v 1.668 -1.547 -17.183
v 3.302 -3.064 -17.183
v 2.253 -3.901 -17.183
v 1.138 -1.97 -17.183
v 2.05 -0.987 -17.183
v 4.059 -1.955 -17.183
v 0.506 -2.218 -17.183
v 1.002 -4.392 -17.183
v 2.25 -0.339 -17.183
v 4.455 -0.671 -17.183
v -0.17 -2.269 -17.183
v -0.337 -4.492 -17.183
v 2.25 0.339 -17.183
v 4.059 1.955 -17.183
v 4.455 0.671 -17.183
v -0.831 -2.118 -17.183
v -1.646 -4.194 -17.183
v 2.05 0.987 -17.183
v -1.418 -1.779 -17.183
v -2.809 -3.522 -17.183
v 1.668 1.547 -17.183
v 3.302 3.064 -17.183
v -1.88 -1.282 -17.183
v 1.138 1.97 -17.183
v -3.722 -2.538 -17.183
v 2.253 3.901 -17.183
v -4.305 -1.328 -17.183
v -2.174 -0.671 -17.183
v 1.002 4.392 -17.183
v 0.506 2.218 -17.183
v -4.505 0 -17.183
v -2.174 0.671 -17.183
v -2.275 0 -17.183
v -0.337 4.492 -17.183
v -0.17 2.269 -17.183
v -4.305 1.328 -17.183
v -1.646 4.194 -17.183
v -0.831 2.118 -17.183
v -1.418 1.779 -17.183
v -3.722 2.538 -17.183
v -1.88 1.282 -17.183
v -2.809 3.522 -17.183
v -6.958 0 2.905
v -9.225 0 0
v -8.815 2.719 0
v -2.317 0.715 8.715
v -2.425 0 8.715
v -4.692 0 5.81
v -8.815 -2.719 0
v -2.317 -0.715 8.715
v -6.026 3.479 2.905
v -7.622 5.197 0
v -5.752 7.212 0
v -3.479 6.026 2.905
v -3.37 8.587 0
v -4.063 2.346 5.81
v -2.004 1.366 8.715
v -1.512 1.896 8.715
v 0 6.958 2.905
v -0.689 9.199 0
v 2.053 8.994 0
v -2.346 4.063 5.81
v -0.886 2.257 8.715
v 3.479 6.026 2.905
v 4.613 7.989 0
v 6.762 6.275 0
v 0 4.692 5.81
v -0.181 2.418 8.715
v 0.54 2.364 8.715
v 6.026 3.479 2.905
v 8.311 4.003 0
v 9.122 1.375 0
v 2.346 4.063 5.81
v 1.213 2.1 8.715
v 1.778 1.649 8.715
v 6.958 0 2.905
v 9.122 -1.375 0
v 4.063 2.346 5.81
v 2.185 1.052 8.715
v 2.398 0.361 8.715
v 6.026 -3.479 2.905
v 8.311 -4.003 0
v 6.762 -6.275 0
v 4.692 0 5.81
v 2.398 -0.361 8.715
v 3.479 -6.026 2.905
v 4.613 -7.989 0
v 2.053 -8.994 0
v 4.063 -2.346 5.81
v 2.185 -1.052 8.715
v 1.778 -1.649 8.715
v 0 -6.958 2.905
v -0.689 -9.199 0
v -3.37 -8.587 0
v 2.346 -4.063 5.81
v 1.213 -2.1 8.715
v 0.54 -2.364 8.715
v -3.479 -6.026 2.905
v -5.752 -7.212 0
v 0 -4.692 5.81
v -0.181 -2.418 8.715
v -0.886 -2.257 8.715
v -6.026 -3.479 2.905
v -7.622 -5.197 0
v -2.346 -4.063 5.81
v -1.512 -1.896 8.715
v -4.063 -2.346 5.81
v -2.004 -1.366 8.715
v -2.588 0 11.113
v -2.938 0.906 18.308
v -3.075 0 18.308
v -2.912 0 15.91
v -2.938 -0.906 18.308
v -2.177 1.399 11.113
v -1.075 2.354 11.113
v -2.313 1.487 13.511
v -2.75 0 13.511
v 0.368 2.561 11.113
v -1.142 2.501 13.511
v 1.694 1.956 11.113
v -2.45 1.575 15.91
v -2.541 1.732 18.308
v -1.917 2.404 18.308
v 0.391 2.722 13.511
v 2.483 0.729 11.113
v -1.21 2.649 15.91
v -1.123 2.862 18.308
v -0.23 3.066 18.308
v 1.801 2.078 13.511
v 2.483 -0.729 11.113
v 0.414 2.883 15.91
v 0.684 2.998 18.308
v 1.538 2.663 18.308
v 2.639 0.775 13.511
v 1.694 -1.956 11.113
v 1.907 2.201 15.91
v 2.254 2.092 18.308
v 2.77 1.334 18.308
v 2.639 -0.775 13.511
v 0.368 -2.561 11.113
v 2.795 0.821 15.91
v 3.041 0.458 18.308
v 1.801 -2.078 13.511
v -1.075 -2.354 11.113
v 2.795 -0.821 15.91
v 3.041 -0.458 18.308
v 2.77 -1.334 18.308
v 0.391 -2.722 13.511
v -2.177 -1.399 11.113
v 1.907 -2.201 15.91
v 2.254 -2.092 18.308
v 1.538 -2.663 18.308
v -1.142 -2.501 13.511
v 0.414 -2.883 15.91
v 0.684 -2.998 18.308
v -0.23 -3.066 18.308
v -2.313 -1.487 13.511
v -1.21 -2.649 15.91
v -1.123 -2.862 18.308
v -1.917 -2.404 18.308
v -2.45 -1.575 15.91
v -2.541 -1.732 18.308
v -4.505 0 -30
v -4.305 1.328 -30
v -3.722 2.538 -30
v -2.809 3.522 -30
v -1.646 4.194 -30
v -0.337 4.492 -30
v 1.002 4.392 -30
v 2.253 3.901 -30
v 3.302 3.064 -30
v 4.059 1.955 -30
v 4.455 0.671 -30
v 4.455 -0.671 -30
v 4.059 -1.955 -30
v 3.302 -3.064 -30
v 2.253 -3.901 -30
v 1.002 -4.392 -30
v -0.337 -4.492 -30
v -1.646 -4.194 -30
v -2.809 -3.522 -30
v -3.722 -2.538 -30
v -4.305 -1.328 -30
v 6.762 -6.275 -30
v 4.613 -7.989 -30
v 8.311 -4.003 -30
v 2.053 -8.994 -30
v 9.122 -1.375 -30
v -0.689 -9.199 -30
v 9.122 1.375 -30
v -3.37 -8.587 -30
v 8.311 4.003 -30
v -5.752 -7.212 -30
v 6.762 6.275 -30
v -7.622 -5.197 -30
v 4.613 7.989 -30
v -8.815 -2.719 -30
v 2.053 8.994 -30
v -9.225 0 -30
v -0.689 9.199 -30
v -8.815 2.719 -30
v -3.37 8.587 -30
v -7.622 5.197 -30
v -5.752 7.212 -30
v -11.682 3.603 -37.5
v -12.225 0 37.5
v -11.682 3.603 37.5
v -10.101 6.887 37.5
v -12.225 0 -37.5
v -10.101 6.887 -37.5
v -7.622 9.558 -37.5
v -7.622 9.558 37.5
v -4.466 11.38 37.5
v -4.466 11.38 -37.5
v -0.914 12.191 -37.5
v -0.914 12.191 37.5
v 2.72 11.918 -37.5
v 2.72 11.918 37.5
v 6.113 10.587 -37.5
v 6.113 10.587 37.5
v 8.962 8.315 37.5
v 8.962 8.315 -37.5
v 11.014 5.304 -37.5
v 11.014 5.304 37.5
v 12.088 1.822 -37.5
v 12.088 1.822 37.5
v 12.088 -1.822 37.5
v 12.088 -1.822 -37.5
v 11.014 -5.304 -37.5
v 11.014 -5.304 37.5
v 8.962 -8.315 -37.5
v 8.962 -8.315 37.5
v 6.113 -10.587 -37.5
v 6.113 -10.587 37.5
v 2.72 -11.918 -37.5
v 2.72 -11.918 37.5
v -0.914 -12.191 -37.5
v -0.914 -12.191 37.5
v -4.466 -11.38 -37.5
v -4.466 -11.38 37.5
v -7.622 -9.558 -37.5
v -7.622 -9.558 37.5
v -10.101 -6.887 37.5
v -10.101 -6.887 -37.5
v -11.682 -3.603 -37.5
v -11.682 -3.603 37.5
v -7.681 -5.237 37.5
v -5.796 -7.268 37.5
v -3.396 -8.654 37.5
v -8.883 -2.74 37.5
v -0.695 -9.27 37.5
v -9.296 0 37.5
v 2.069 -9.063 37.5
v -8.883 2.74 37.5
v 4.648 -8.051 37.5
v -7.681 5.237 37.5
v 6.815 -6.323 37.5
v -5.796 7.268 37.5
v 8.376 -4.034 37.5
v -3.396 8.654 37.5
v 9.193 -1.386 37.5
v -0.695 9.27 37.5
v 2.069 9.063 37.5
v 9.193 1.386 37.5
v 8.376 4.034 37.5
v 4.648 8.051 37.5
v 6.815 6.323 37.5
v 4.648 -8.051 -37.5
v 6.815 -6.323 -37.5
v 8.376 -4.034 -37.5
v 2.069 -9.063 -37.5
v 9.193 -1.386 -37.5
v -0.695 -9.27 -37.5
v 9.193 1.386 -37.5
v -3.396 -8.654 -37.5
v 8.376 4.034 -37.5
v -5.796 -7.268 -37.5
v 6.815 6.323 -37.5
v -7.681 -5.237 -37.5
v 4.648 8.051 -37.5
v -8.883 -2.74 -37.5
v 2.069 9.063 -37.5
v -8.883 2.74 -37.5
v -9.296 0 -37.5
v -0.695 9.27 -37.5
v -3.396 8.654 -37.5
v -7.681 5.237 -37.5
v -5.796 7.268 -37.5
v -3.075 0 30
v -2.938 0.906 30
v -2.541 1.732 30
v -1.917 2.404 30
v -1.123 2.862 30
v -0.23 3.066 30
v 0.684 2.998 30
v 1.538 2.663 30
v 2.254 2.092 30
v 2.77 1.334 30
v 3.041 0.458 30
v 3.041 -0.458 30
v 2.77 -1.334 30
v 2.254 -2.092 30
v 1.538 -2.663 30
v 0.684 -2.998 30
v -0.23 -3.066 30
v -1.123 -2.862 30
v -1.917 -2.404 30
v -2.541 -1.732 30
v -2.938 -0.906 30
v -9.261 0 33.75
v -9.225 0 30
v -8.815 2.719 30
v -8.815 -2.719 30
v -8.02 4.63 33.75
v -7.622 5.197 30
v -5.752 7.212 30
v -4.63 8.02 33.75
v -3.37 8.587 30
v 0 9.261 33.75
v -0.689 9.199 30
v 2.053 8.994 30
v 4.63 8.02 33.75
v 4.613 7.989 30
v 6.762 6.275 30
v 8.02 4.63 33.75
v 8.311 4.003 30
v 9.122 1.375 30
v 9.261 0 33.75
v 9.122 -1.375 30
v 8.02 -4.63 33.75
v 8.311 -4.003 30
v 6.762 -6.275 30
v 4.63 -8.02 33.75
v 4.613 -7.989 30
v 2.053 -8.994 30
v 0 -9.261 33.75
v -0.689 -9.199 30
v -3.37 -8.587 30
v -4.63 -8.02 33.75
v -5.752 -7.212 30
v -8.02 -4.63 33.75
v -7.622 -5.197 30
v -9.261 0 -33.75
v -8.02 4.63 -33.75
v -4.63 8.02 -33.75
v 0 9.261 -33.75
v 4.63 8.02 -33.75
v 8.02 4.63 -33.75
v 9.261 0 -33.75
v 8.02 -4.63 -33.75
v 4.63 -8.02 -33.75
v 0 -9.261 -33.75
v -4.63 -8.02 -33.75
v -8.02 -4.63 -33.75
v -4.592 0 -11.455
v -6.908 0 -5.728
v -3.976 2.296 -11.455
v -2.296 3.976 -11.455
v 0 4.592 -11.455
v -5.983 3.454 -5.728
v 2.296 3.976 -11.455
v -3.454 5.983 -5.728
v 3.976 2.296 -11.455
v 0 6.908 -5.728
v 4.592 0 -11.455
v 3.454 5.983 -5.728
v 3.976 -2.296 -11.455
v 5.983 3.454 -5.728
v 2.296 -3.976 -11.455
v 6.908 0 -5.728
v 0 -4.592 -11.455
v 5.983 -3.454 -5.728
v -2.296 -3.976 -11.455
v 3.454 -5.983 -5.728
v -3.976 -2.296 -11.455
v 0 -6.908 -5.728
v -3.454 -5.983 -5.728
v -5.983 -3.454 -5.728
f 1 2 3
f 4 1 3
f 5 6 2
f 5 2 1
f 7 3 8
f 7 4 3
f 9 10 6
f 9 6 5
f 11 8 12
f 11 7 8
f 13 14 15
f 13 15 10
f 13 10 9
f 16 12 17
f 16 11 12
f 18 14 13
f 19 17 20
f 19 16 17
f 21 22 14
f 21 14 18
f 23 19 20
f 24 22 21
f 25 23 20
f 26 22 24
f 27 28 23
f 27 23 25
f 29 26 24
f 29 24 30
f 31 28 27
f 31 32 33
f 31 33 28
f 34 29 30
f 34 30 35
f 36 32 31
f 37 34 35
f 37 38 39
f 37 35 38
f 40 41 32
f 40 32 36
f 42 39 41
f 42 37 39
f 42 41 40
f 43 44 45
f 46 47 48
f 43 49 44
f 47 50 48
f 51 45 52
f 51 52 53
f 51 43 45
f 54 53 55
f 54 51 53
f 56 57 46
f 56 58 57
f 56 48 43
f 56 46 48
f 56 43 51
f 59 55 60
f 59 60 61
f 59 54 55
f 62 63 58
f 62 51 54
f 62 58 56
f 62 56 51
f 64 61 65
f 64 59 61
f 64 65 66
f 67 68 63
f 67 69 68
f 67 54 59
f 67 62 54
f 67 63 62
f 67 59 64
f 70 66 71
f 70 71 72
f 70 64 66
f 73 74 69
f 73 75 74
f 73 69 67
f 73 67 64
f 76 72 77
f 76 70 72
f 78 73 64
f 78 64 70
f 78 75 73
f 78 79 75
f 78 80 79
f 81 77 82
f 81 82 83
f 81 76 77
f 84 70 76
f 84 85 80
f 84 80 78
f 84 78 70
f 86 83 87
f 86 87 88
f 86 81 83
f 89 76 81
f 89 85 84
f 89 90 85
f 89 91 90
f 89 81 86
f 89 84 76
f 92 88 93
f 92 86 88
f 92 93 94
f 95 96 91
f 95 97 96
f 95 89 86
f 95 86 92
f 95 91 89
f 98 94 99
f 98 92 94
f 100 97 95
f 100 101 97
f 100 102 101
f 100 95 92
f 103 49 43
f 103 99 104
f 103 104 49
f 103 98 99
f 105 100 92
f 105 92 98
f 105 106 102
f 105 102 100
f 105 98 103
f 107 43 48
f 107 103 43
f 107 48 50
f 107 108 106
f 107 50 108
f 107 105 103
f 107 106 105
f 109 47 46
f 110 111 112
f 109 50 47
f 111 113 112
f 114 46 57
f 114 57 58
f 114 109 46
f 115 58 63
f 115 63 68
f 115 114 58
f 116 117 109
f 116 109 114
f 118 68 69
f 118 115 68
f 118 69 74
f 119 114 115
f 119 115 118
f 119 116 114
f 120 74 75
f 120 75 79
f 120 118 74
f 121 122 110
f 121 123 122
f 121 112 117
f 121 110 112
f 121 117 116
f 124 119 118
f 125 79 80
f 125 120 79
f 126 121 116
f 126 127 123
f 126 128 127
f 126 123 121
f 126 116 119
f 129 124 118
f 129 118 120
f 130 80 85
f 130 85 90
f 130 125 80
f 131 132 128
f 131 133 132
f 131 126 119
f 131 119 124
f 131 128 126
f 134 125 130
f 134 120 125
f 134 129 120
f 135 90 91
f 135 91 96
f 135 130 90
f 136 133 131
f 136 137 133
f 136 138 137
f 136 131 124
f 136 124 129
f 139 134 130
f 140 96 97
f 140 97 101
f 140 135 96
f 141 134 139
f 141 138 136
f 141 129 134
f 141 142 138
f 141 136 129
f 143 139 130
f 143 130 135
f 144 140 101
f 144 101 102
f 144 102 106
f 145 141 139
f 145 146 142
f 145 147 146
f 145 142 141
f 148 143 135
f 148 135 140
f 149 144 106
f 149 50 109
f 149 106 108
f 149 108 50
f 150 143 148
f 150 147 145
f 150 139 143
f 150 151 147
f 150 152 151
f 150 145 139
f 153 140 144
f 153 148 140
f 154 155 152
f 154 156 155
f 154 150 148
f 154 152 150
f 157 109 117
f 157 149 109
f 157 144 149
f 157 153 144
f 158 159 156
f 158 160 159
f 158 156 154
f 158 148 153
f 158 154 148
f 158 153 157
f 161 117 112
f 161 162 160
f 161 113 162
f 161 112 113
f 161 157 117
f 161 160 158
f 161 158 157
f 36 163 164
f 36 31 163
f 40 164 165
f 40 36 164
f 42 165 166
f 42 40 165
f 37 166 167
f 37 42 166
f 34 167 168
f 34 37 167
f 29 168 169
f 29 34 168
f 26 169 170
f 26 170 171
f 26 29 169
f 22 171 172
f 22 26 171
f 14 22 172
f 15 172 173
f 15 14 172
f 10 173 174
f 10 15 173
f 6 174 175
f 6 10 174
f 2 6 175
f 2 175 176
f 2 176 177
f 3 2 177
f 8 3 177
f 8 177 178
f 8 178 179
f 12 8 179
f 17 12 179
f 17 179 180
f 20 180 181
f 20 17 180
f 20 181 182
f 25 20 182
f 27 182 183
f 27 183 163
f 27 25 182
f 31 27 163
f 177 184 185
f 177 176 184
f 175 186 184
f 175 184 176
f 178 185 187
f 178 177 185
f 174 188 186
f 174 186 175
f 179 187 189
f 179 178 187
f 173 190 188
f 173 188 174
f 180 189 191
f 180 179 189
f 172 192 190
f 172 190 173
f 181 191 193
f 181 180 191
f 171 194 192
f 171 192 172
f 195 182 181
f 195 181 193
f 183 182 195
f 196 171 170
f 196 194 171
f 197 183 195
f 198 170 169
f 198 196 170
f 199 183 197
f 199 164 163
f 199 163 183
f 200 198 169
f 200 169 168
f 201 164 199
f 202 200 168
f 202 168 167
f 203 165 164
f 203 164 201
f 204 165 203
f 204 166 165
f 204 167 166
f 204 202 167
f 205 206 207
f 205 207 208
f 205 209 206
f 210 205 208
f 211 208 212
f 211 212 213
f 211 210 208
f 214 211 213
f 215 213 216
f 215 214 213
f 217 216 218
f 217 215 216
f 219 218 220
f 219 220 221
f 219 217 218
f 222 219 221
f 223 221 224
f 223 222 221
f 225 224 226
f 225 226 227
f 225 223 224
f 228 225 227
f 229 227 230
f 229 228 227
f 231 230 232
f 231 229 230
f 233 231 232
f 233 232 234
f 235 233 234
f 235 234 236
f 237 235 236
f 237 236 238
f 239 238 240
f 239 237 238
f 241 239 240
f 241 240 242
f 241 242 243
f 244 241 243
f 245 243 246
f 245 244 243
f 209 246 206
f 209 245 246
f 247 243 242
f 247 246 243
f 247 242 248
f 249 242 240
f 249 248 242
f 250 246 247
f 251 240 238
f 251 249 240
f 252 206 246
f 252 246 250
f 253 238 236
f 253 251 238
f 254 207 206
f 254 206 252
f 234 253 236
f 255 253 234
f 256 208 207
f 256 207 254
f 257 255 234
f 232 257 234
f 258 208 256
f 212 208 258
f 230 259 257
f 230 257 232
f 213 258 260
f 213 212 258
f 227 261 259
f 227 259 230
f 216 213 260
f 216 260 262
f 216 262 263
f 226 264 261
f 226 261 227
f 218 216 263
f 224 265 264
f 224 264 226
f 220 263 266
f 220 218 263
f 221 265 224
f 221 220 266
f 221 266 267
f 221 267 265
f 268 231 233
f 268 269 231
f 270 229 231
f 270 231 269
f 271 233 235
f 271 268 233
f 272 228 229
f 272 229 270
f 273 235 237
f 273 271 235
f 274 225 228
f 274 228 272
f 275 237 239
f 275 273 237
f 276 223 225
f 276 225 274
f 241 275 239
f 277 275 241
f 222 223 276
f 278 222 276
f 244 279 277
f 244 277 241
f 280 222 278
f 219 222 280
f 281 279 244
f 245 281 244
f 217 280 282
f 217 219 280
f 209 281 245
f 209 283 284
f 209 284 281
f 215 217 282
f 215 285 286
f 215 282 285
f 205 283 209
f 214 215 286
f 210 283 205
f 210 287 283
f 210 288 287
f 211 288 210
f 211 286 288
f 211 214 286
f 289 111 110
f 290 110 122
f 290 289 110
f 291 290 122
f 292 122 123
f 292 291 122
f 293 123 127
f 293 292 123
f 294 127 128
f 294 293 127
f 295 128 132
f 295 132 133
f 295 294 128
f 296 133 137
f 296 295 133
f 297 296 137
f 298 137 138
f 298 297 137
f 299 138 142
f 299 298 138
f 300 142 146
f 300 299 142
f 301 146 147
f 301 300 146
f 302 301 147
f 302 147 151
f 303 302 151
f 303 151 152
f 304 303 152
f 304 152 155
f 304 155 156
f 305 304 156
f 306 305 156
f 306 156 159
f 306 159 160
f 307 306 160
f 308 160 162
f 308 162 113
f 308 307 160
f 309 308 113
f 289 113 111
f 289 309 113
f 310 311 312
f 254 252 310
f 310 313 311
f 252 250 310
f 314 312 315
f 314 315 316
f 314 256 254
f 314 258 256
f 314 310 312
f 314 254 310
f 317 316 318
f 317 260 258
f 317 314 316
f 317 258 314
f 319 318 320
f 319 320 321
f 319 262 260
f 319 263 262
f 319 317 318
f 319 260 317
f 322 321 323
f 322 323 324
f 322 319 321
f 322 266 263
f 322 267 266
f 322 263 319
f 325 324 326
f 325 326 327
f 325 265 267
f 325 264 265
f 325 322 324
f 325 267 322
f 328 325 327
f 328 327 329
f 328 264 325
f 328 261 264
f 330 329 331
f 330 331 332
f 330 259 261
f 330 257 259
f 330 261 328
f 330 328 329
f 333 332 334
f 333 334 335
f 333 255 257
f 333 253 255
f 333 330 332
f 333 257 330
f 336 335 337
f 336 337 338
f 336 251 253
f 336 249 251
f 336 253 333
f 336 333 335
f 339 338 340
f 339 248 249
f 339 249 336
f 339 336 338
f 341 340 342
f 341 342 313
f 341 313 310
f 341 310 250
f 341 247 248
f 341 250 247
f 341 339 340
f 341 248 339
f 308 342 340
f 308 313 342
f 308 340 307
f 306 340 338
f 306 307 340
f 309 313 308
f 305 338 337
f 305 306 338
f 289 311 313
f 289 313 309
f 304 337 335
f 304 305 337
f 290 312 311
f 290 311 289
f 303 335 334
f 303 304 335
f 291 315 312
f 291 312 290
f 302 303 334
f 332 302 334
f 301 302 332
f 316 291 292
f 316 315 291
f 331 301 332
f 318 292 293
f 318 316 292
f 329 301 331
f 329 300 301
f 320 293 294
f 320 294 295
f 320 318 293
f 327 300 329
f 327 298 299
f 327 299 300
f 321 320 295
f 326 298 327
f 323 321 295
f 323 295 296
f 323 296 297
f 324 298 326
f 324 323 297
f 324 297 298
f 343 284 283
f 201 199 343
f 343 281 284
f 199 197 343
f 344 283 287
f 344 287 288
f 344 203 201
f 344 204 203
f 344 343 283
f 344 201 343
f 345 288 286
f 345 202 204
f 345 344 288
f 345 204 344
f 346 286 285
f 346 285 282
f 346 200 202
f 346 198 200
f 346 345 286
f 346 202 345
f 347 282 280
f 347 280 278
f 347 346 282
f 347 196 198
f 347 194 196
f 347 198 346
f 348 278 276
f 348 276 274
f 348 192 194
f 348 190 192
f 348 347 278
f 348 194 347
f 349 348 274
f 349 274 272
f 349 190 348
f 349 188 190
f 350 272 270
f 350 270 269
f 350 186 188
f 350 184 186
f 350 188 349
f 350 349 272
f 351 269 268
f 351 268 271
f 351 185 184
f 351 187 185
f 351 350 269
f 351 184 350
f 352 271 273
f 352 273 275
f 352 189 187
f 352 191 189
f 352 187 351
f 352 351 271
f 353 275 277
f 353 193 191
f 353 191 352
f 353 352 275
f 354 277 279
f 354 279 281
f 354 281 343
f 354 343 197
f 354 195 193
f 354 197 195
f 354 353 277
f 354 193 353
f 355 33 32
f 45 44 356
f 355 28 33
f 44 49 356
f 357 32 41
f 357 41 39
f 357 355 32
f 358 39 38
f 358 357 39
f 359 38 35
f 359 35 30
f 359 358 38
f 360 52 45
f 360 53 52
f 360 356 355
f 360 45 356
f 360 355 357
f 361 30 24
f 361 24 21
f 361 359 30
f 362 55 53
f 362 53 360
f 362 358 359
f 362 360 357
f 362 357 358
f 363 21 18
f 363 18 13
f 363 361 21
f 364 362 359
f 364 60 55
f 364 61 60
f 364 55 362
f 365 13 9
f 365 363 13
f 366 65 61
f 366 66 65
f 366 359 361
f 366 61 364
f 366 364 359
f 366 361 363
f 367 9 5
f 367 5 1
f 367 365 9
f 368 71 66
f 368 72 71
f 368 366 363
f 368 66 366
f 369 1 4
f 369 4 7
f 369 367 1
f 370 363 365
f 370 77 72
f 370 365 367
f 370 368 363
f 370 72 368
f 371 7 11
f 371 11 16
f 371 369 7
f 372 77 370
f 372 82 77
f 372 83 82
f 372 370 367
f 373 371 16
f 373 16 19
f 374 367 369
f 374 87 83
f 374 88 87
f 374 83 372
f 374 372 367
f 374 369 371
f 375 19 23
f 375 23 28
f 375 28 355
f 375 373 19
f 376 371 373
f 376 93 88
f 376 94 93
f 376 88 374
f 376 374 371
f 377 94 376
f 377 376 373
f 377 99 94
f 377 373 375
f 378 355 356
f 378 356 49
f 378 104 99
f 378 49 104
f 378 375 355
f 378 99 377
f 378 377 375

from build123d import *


with BuildPart() as f1:
    # F0 (on Front) → F1 (revolve)
    with BuildSketch(Plane.XZ):
        Polygon((-9.225, 0), (-9.225, 30), (-12.225, 30), (-12.225, -30), (-9.225, -30), align=None)
        Polygon((-9.225, -30), (-4.505, -30), (-4.505, -17.18318), (-9.225, 0), align=None)
        Polygon((-2.275, -17.18318), (-9.225, 0), (-4.505, -17.18318), align=None)
        Polygon((-3.075, 18.308065), (-3.075, 30), (-9.225, 30), (-9.225, 0), (-2.425, 8.714551), align=None)
        Polygon((-12.225, 30), (-9.225, 30), (-9.296466, 37.5), (-12.225, 37.5), align=None)
        Polygon((-9.296466, -37.5), (-9.225, -30), (-12.225, -30), (-12.225, -37.5), align=None)
    revolve(axis=Axis((0, 0, 0), (0, 0, -1)))


solid = f1.part
